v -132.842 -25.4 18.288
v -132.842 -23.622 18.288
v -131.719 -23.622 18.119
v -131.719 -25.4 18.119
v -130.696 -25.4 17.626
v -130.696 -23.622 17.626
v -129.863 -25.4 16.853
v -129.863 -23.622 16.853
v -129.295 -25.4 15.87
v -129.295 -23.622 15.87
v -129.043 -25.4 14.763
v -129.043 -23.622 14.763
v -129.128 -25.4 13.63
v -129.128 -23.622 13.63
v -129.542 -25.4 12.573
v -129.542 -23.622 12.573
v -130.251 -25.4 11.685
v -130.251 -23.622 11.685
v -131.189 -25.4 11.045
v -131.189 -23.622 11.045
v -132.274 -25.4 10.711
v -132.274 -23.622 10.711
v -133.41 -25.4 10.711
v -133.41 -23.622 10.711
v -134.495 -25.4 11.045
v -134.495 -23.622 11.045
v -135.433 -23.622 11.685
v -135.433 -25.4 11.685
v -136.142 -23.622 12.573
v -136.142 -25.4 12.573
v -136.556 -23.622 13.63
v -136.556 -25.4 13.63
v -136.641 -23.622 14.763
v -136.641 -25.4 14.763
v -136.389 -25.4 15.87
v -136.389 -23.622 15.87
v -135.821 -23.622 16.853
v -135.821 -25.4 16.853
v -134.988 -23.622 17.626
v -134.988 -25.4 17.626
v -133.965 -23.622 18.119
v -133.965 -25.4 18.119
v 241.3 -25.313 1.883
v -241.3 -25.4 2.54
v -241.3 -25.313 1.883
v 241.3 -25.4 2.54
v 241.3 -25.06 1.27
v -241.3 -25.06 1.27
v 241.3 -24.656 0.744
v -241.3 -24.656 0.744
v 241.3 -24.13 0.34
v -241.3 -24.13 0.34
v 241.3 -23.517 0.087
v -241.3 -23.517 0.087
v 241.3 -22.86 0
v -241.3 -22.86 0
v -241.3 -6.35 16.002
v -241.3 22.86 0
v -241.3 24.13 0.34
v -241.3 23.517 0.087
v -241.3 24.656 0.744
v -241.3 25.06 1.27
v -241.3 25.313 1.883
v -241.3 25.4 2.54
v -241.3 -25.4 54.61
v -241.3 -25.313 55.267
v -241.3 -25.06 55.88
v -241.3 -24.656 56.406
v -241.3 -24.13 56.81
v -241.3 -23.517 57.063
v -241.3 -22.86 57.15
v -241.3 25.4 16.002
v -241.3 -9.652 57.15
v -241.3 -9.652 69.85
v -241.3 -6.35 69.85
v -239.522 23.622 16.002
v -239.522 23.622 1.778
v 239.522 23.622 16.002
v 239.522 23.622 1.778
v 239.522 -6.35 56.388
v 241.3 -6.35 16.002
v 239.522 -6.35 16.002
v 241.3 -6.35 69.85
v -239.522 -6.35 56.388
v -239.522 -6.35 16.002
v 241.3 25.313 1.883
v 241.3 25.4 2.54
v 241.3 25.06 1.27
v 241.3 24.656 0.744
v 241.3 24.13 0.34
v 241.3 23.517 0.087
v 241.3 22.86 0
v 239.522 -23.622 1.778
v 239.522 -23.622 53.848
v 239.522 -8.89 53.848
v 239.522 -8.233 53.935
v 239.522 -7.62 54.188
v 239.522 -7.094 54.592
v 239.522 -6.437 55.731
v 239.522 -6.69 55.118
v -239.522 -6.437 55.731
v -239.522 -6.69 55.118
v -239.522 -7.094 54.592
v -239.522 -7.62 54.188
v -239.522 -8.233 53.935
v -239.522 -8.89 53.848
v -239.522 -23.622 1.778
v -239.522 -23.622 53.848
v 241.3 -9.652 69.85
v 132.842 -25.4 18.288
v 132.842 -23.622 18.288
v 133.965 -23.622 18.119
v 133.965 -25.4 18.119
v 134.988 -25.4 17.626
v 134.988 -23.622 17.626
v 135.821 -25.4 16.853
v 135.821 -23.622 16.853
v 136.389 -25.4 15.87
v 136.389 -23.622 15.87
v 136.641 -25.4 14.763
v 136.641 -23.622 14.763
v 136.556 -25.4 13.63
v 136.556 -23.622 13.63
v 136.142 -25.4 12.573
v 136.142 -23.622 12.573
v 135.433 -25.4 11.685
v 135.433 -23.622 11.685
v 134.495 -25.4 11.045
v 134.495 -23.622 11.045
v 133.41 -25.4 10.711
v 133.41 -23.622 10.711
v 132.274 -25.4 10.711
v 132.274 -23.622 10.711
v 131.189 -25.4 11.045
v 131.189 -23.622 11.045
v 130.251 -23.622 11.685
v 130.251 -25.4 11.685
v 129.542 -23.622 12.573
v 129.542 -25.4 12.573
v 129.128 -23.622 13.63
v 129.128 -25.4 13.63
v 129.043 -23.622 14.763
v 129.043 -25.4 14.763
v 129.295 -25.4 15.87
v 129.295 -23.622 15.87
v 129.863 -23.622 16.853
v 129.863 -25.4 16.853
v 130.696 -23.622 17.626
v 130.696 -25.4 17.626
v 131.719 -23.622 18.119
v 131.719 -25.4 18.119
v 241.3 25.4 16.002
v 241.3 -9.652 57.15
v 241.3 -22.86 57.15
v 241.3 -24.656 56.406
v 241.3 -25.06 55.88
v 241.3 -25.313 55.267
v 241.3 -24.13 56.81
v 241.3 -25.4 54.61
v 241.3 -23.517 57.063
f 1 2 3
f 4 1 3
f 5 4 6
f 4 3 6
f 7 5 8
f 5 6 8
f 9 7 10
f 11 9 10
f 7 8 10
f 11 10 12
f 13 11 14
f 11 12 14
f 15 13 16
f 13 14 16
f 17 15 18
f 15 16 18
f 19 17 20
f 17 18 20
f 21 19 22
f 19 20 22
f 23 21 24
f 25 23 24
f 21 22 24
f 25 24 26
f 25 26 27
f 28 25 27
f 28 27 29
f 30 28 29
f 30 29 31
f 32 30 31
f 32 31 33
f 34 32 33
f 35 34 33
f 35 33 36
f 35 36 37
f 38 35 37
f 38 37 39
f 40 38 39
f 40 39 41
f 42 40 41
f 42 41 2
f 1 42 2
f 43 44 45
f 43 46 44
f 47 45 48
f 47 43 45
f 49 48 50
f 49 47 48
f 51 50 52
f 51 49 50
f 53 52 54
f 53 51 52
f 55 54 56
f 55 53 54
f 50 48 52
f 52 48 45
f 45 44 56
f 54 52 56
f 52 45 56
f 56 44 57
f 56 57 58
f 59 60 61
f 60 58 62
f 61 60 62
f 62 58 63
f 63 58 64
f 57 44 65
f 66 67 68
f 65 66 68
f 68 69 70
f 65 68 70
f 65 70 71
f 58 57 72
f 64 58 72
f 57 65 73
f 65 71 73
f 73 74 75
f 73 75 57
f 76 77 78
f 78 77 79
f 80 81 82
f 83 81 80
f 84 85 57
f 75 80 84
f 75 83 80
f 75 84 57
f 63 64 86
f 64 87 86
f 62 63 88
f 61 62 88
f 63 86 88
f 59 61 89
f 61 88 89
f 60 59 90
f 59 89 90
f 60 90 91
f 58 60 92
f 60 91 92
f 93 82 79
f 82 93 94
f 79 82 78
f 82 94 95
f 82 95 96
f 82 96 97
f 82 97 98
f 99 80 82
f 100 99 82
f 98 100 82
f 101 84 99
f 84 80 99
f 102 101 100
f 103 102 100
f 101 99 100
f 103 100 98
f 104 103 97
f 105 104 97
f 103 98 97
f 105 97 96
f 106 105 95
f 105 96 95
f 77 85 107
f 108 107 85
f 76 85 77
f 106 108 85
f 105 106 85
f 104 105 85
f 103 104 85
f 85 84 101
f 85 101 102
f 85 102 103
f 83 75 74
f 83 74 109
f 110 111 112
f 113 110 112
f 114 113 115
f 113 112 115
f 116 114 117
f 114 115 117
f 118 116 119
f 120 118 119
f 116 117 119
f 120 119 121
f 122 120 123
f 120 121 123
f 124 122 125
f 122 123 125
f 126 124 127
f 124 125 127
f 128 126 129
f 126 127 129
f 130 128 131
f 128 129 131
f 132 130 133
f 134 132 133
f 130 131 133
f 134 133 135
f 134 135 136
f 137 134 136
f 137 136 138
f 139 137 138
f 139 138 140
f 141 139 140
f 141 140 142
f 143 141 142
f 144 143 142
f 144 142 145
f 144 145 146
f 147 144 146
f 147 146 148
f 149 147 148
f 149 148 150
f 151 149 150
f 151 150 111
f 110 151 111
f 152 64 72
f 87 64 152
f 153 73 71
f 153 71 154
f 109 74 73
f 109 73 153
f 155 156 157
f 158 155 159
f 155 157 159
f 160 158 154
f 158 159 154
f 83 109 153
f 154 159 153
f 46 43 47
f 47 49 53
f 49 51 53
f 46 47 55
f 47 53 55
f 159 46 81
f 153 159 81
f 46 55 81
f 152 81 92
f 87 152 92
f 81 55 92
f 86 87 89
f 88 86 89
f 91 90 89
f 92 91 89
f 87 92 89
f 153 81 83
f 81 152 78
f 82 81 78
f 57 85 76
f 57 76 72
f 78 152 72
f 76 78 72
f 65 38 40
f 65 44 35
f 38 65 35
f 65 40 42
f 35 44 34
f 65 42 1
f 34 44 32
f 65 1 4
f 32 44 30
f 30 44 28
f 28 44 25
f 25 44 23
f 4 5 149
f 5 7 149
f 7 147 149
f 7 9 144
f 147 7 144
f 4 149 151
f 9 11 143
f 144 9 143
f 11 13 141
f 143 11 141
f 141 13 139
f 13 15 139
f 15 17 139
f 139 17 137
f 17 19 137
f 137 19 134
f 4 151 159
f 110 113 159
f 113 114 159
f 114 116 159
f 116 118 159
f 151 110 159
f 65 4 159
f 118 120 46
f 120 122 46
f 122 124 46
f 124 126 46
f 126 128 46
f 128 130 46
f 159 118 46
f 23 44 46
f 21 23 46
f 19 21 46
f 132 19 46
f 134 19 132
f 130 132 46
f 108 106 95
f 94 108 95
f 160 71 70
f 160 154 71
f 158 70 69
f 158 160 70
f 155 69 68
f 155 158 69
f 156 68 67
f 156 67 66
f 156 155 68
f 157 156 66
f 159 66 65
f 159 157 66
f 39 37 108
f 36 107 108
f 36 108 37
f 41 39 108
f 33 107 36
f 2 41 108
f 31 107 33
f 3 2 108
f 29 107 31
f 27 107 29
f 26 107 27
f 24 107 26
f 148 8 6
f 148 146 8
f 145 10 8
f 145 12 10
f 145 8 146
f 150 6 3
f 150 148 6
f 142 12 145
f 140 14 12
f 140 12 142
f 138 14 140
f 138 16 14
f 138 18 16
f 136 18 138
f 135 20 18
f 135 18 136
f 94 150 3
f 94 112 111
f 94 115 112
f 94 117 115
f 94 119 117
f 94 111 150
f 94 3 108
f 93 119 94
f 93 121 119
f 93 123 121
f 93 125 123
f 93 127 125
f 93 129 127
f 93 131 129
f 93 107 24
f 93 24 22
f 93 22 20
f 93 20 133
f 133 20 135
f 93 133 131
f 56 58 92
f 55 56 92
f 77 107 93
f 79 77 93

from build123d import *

# Parameters (mm, degrees)
SKETCH1_W           = 482.6
SKETCH1_H           = 50.8
BOSS_EXTRUDE1_DEPTH = 69.85
CUT_EXTRUDE2_DEPTH  = 49.022
SKETCH3_W           = 482.6
SKETCH3_H           = 16.002
CUT_EXTRUDE3_DEPTH  = 31.75
SKETCH4_W           = 482.6
SKETCH4_H           = 15.748
CUT_EXTRUDE4_DEPTH  = 12.7
SHELL2_START        = -23.622
SHELL2_OUTLINE_W    = 479.044
SHELL2_OUTLINE_H    = 14.224
SHELL2_DEPTH        = 47.244
SKETCH5_W           = 1.778
SKETCH5_H           = 17.272
BOSS_EXTRUDE2_DEPTH = 44.45
FILLET1_R           = 2.54
SKETCH6_R           = 3.81
CUT_EXTRUDE5_DEPTH  = 44.45


# Read off the part's stored shape, not the designer's step: Shell2
with BuildPart() as part:
    # Sketch1 → Boss-Extrude1 (new body)
    with BuildSketch(Plane.XY):
        Rectangle(SKETCH1_W, SKETCH1_H)
    extrude(amount=BOSS_EXTRUDE1_DEPTH)

    # Sketch2 → Cut-Extrude2 (cut)
    with BuildSketch(Plane(origin=(0, 25.4, 0), x_dir=(1, 0, 0), z_dir=(0, 1, 0))):
        Polygon((241.3, -16.002), (-241.3, -16.002), (-241.3, -34.925), (-241.3, -53.848), (241.3, -53.848), align=None)
    extrude(amount=-CUT_EXTRUDE2_DEPTH, mode=Mode.SUBTRACT)

    # Sketch3 → Cut-Extrude3 (cut)
    with BuildSketch(Plane(origin=(0, 25.4, 0), x_dir=(1, 0, 0), z_dir=(0, 1, 0))):
        with Locations((0, -61.849)):
            Rectangle(SKETCH3_W, SKETCH3_H)
    extrude(amount=-CUT_EXTRUDE3_DEPTH, mode=Mode.SUBTRACT)

    # Sketch4 → Cut-Extrude4 (cut)
    with BuildSketch(Plane.XY.offset(69.85)):
        with Locations((0, -17.526)):
            Rectangle(SKETCH4_W, SKETCH4_H)
    extrude(amount=-CUT_EXTRUDE4_DEPTH, mode=Mode.SUBTRACT)

    # Shell2 outline → Shell2 (cut)
    with BuildSketch(Plane(origin=(0, 0, 0), x_dir=(1, 0, 0), z_dir=(0, 1, 0)).offset(SHELL2_START)):
        with Locations((0, -8.89)):
            Rectangle(SHELL2_OUTLINE_W, SHELL2_OUTLINE_H)
    extrude(amount=SHELL2_DEPTH, mode=Mode.SUBTRACT)

    # Sketch5 → Boss-Extrude2 (add)
    with BuildSketch(Plane(origin=(0, 0, 53.848), x_dir=(-1, 0, 0), z_dir=(0, 0, -1))):
        with Locations((240.411, -14.986)):
            Rectangle(SKETCH5_W, SKETCH5_H)
        with Locations((-240.411, -14.986)):
            Rectangle(SKETCH5_W, SKETCH5_H)
    extrude(amount=BOSS_EXTRUDE2_DEPTH)

    # Fillet1
    fillet1_edges = [part.edges().sort_by_distance(p)[0] for p in [
        (0, -25.4, 0),
        (0, -25.4, 57.15),
        (0, 25.4, 0),
        (0, -6.35, 53.848),
    ]]
    fillet(fillet1_edges, radius=FILLET1_R)

    # Sketch6 → Cut-Extrude5 (cut)
    with BuildSketch(Plane(origin=(0, -23.622, 0), x_dir=(1, 0, 0), z_dir=(0, 1, 0))):
        with Locations(Location((-132.842, -14.478, 0), (0, 0, 270))):
            Circle(SKETCH6_R)
        with Locations(Location((132.842, -14.478, 0), (0, 0, 270))):
            Circle(SKETCH6_R)
    extrude(amount=-CUT_EXTRUDE5_DEPTH, mode=Mode.SUBTRACT)


solid = part.part
